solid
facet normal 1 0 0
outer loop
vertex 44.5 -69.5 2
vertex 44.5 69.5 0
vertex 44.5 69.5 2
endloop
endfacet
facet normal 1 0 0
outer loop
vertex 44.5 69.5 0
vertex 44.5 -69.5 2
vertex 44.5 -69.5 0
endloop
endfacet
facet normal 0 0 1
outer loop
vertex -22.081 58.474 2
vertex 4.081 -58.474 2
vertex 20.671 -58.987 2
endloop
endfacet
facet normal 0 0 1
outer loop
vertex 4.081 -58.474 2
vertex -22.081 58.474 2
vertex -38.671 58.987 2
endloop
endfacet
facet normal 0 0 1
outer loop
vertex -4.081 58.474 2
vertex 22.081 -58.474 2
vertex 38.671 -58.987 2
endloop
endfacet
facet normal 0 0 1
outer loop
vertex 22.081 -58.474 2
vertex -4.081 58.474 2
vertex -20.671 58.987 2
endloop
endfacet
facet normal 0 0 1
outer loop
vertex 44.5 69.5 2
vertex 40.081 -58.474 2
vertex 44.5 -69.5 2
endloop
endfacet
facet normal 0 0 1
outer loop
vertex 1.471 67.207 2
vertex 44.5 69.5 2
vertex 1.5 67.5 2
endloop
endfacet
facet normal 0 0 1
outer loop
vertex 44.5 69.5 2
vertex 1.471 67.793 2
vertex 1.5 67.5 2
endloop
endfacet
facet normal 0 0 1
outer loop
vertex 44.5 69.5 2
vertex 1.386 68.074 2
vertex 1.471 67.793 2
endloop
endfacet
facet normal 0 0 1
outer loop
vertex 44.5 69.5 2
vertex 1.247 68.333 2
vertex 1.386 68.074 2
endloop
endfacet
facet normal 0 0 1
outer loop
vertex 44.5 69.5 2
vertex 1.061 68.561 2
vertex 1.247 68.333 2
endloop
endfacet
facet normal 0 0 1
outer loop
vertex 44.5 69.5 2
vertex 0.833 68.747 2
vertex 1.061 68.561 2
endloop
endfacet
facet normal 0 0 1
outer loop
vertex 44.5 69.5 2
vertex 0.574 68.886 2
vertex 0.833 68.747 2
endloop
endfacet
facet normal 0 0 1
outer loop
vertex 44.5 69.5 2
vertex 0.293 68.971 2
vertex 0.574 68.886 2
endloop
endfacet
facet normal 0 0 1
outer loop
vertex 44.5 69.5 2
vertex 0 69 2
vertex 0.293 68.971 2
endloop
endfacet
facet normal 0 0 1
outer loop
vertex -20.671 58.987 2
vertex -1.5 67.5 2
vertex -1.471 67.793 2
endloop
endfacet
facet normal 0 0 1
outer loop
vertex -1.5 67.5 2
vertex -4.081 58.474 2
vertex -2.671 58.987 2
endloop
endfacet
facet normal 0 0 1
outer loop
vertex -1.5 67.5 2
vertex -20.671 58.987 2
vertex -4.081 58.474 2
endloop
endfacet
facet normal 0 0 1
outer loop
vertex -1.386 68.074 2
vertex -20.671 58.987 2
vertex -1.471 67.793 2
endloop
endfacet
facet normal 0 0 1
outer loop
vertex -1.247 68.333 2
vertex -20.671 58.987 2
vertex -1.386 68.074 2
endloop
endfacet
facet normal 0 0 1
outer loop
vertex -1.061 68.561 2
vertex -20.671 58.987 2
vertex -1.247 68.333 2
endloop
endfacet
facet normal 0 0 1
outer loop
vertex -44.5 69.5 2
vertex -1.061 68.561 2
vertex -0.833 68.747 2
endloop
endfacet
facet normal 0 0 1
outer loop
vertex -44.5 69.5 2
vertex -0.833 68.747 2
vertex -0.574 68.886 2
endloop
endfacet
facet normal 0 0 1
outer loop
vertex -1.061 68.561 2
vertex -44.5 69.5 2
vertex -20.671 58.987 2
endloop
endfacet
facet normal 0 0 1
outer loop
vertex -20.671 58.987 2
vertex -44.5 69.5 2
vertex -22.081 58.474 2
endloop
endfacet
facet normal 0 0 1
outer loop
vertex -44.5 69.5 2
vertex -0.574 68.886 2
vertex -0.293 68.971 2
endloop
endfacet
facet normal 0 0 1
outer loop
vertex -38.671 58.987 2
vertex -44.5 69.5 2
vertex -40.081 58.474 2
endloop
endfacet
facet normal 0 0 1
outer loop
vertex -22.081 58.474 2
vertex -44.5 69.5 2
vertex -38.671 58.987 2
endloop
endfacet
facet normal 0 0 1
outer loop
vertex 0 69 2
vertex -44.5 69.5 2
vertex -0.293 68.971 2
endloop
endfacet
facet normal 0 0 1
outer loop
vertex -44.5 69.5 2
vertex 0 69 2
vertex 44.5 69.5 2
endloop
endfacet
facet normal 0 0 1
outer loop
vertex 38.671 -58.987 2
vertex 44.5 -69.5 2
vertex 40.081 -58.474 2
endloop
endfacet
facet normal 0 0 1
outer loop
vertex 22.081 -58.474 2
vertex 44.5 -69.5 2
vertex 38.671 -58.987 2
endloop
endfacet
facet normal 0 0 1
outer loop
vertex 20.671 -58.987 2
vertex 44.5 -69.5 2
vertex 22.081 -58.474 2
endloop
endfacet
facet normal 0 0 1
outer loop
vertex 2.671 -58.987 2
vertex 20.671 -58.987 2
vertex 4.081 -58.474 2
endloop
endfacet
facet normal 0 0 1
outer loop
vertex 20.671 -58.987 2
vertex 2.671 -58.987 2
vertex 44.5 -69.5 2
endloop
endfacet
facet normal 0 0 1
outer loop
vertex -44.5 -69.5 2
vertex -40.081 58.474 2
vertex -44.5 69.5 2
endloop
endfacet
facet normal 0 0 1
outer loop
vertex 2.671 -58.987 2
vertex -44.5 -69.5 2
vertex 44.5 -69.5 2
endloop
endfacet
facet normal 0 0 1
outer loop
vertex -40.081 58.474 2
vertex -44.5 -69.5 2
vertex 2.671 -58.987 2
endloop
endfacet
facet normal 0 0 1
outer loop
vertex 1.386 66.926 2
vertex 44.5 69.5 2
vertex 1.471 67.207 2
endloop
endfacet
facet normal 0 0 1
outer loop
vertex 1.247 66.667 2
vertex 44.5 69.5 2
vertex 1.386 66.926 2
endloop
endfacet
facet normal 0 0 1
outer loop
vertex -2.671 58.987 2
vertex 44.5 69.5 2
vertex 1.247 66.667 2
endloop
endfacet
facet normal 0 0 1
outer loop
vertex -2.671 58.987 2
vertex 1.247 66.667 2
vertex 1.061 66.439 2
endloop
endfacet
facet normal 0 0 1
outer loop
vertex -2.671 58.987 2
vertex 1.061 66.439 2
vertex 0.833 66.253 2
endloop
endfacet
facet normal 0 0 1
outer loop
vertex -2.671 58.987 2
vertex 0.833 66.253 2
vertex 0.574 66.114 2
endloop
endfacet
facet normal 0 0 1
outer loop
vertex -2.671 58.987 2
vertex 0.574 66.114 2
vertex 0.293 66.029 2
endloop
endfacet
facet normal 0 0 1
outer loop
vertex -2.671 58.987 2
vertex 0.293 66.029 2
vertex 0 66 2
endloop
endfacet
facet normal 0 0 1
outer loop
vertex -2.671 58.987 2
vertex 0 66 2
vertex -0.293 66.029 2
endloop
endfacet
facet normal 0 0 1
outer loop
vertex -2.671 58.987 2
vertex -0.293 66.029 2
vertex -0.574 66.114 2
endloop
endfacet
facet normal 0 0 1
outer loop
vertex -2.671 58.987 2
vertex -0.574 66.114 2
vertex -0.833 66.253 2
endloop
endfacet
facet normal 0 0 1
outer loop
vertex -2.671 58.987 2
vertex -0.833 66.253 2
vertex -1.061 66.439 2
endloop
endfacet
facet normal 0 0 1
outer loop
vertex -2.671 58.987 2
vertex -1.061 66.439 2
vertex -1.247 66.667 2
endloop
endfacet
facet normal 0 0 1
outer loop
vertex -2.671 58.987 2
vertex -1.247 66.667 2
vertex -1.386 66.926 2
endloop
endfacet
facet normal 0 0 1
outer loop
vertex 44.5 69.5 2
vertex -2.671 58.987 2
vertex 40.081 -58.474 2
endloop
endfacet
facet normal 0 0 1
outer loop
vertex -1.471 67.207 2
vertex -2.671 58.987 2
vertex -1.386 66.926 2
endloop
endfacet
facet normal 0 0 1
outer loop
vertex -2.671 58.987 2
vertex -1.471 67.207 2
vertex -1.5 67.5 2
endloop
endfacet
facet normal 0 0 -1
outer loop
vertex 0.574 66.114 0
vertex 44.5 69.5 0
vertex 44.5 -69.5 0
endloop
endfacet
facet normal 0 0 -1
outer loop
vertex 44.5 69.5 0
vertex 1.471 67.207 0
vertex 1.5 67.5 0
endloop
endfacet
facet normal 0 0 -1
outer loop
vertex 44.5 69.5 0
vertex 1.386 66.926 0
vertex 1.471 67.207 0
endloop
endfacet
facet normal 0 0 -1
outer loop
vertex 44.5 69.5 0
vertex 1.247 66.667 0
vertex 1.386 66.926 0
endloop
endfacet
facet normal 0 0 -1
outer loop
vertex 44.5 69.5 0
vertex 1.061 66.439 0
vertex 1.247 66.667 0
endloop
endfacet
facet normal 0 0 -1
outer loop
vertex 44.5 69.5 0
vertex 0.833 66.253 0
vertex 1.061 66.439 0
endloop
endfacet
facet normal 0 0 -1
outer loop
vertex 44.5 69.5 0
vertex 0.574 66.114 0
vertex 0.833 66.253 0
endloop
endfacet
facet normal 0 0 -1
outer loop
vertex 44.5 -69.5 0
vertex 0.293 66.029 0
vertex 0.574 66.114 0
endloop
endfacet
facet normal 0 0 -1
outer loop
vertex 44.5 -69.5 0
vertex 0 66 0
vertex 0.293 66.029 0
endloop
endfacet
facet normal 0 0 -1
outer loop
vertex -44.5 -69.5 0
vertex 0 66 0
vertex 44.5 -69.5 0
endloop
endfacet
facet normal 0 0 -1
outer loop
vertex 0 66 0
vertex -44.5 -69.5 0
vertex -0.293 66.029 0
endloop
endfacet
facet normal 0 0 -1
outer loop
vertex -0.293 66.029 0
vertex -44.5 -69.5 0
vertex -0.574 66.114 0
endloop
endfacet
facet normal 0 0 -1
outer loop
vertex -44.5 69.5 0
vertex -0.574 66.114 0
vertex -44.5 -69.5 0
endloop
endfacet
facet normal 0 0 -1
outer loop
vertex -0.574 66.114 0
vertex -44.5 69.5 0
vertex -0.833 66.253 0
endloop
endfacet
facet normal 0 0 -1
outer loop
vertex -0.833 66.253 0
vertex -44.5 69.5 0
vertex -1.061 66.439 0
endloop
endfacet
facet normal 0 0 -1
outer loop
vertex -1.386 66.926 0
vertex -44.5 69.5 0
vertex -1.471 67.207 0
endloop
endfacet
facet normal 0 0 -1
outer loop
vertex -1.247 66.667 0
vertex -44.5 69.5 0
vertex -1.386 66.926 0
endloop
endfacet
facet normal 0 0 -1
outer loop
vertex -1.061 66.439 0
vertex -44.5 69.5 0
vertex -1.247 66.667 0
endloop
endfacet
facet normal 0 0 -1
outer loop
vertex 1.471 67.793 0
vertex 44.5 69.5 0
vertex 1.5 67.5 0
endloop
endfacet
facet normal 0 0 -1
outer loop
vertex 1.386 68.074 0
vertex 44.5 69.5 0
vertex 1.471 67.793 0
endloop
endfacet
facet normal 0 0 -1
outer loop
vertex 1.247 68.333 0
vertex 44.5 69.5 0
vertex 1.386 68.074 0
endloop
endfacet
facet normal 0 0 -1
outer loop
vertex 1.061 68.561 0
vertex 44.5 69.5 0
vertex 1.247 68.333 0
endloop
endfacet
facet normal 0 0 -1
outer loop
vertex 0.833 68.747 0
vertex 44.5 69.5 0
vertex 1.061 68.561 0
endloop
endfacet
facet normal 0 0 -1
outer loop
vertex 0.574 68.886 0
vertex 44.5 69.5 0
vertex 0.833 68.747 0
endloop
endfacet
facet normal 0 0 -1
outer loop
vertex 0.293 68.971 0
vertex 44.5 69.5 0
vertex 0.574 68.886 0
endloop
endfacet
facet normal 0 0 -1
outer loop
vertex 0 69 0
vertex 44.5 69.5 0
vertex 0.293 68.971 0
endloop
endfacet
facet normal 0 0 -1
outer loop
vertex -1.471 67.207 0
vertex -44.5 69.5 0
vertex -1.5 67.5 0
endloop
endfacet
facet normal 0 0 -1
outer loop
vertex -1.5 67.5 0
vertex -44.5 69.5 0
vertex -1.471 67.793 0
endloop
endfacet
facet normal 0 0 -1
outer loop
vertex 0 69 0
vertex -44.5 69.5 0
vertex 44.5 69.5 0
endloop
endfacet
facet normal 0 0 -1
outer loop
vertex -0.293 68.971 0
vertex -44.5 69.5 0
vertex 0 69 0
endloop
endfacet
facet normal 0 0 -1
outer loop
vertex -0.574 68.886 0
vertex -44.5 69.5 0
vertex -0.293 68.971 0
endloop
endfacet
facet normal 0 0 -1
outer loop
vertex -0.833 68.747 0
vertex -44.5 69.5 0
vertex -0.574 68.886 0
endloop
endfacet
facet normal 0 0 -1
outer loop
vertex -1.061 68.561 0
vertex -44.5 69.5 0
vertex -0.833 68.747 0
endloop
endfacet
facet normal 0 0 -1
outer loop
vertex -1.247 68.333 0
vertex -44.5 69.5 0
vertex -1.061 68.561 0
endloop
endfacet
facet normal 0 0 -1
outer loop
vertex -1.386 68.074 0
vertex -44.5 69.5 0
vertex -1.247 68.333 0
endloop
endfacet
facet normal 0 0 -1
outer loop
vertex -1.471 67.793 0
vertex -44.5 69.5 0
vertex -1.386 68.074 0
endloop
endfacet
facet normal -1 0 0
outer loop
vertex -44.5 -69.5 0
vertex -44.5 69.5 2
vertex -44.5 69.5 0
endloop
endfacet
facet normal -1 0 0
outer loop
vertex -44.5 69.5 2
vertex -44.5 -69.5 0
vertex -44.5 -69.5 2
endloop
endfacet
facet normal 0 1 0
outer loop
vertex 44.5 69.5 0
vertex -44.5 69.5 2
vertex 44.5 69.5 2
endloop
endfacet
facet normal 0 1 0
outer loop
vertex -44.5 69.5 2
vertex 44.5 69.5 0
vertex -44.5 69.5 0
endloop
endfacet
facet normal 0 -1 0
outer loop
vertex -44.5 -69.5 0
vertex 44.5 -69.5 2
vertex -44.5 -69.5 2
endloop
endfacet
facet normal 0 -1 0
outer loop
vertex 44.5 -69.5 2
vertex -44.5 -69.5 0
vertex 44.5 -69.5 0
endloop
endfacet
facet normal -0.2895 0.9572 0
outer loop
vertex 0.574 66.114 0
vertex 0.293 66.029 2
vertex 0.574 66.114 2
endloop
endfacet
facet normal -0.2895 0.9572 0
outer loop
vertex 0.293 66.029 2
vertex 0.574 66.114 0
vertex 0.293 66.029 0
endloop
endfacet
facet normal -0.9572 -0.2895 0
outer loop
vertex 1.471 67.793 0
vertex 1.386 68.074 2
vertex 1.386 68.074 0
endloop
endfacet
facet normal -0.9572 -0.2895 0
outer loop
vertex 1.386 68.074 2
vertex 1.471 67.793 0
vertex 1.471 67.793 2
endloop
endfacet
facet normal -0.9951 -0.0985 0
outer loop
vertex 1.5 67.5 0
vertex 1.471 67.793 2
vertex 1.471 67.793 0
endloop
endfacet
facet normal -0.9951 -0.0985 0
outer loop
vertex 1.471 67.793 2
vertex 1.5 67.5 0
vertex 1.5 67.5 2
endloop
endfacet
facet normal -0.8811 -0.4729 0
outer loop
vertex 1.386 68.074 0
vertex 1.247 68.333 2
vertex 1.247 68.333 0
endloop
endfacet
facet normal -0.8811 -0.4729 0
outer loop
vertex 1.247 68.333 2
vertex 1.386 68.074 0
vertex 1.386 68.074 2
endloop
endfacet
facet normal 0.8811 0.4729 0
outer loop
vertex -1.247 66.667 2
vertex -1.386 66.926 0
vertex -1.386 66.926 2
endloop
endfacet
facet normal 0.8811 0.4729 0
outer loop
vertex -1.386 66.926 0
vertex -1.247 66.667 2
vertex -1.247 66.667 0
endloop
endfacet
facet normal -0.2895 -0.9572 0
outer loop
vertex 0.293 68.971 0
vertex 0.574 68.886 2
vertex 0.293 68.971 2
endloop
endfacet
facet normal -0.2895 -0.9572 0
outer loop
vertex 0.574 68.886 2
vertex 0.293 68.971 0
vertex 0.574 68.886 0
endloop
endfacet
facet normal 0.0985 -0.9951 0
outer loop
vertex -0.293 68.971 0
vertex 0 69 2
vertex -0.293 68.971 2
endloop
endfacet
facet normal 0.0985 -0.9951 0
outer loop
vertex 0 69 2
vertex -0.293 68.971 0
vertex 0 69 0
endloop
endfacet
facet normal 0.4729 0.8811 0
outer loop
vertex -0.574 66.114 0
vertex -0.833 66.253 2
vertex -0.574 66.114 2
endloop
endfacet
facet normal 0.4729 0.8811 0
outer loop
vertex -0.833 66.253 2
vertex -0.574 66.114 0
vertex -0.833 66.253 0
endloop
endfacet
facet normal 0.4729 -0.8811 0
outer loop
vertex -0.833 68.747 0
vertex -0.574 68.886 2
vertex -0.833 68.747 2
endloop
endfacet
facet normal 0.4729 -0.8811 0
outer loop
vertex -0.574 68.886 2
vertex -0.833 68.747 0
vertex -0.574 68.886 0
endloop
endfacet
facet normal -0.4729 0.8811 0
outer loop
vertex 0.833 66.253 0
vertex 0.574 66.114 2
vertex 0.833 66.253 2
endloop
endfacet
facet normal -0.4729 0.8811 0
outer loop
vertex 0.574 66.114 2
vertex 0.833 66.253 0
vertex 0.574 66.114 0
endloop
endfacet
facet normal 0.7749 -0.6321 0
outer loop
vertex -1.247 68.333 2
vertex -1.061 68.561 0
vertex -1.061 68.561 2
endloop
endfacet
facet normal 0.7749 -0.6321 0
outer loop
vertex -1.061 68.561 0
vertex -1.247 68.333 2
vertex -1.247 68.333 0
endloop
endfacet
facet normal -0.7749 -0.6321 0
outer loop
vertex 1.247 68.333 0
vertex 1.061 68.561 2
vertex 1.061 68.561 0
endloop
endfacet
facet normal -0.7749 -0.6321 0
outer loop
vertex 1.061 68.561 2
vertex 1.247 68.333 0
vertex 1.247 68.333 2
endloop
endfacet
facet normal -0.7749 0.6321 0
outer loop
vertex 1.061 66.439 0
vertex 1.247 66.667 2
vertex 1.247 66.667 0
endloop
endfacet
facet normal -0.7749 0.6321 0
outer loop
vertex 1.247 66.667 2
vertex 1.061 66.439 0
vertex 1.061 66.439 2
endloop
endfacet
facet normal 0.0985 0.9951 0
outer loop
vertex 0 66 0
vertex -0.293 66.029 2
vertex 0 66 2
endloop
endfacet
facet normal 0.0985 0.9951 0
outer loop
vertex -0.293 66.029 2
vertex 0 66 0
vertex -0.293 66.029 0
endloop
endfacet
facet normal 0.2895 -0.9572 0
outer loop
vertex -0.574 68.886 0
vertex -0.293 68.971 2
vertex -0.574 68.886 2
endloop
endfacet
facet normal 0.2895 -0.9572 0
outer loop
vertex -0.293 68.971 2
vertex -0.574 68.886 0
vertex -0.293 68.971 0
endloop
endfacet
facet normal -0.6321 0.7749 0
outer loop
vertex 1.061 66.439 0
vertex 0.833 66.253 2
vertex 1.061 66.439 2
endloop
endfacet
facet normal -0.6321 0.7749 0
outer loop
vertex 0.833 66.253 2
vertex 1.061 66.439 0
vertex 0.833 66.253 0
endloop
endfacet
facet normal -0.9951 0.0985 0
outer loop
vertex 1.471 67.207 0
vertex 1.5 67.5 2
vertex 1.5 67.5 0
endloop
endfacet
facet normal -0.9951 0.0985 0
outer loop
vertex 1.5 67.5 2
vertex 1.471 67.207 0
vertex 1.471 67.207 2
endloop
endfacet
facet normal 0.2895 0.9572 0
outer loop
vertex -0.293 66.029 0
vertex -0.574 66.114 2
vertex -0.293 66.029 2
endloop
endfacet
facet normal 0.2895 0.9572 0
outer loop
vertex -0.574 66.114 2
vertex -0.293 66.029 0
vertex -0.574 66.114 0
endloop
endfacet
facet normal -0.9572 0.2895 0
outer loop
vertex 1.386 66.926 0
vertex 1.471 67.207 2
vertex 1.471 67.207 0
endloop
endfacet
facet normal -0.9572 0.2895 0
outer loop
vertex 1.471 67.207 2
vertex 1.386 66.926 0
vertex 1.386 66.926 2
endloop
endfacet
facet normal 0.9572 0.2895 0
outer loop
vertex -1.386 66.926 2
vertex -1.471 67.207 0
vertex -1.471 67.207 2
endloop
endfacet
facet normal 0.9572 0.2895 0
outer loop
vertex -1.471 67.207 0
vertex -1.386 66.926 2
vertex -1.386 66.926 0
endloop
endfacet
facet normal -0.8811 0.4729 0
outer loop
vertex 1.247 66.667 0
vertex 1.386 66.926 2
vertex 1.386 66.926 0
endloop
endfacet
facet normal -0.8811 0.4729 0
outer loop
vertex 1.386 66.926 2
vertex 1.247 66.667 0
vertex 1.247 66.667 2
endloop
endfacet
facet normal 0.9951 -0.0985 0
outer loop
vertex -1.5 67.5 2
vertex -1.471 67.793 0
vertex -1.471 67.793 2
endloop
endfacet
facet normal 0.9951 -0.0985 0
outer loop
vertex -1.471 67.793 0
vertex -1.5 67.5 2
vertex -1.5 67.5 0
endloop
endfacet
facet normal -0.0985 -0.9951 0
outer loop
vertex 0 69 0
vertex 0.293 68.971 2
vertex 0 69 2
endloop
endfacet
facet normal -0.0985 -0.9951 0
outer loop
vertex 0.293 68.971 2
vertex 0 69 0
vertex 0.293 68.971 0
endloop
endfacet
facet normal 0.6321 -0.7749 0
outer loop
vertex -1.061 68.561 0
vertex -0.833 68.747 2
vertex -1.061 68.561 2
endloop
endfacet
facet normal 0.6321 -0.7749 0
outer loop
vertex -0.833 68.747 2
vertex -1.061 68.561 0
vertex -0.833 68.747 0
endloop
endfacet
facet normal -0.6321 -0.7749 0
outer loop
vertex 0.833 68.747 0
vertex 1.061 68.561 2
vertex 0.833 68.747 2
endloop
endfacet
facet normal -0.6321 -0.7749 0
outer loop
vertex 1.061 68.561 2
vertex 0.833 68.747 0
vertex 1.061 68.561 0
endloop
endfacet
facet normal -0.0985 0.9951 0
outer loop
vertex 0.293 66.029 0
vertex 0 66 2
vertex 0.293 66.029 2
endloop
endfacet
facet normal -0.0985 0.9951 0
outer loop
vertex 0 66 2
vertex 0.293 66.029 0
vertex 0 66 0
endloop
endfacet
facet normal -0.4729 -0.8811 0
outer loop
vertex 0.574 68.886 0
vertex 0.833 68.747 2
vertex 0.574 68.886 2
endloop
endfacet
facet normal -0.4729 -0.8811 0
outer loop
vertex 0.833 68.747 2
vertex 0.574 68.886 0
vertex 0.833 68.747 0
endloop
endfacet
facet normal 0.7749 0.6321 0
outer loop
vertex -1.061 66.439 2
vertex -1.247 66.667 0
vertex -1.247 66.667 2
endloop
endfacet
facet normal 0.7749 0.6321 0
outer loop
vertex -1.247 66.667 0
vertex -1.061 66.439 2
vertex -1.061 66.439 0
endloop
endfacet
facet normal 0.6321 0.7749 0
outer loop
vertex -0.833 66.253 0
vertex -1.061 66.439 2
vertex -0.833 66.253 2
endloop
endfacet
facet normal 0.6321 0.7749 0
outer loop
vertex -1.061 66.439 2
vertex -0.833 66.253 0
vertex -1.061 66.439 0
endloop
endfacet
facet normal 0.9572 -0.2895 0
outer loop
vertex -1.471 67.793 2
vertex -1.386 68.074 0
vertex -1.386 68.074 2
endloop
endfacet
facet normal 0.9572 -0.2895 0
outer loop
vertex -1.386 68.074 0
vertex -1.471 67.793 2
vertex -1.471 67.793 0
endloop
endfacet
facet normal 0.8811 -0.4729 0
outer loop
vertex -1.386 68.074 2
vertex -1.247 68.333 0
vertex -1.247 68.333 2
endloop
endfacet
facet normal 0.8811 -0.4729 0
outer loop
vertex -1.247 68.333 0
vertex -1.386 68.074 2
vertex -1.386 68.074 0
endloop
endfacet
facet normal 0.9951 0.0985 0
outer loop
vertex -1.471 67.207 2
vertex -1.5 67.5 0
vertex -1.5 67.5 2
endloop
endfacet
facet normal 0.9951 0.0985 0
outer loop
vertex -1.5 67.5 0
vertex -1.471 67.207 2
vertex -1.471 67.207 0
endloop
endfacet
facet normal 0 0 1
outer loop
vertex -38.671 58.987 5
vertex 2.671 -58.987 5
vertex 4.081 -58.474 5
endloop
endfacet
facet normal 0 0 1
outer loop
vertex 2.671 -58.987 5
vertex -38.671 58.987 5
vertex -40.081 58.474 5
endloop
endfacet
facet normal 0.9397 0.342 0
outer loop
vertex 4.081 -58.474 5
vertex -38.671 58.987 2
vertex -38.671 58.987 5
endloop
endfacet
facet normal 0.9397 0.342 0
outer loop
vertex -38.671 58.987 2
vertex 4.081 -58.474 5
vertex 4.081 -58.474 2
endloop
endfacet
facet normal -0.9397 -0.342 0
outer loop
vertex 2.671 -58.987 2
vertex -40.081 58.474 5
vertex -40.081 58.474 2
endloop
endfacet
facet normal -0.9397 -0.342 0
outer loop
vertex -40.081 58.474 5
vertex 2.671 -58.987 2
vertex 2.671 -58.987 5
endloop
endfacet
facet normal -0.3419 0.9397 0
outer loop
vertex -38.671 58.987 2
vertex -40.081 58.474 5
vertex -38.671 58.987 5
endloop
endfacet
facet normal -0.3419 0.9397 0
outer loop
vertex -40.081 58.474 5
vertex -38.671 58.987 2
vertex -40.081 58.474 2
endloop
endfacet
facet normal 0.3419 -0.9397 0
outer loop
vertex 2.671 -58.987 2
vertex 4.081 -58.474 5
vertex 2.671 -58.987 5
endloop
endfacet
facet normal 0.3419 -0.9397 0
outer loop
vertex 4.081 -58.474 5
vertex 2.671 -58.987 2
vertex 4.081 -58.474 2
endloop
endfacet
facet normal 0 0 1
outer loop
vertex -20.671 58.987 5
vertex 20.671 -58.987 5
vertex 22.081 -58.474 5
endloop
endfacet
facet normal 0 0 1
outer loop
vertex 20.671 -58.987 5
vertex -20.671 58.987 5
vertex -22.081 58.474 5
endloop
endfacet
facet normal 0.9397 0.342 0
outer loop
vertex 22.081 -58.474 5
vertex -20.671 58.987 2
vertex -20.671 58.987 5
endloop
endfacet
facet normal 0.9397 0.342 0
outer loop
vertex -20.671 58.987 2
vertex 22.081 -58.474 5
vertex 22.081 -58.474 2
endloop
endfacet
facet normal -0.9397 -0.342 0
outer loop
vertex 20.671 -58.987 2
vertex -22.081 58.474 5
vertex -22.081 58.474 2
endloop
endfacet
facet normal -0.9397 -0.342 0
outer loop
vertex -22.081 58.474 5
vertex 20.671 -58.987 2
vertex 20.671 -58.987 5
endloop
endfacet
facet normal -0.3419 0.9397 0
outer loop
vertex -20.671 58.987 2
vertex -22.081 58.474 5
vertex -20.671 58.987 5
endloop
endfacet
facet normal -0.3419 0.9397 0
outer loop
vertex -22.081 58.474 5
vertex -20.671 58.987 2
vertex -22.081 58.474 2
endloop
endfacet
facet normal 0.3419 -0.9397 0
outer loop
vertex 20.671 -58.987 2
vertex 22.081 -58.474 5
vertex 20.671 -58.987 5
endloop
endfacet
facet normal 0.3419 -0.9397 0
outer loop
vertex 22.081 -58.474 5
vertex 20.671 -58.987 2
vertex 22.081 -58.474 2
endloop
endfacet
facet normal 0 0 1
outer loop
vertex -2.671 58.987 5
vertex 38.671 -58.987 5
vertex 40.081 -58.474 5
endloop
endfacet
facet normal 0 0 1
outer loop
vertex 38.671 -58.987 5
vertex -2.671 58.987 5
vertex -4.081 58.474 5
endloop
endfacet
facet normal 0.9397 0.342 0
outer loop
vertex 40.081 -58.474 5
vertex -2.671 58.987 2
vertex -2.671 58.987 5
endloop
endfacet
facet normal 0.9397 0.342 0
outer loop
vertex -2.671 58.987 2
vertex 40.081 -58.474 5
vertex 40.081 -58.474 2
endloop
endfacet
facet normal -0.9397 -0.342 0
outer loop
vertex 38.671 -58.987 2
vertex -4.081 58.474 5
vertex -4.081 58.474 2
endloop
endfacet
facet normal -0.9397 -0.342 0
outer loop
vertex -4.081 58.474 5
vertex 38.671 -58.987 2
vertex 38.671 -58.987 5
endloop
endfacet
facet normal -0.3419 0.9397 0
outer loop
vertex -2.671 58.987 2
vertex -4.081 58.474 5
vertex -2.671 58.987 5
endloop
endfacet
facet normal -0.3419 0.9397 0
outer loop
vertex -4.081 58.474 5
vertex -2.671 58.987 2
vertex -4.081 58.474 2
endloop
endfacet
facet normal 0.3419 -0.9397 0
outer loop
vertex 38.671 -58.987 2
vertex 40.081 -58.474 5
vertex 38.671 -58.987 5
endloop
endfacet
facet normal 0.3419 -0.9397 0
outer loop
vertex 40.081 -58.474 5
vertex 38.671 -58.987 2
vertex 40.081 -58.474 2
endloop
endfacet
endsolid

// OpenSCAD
// Baffle Insert V3.5 — Rectangular Testing Variant
// For AeroCool Flat Tile V3.5 (rectangular test build)
// Drops into the expansion chamber of the rectangular base tile V3.5
// Print: Flat on bed, with FUZZY SKIN enabled, PETG, 0.2mm layer, 15-20% infill
// Estimated print time: ~25-35 min, ~12g PETG
//
// IMPORTANT: Enable FUZZY SKIN in your slicer for water retention!
// Cura: Experimental > Fuzzy Skin (thickness 0.3-0.5mm, density 1.0-2.0)
// PrusaSlicer: Layers and perimeters > Fuzzy skin
// This creates microscopic pockets that trap water on hydrophobic PETG.

// ============================================================
// PARAMETERS (must match base tile V3.5)
// ============================================================

INSERT_WIDTH = 89;        // Chamber inner width - 1mm tolerance (100 - 10 - 1 = 89)
INSERT_LENGTH = 139;      // Chamber inner length - 1mm tolerance (150 - 10 - 1 = 139)
INSERT_THICKNESS = 2;     // Base plate thickness (mm)
FIN_HEIGHT = 3;           // Fin height above plate (mm)
FIN_LENGTH = 125;         // Fin length (mm) — spans most of the insert length
FIN_THICKNESS = 1.5;      // Fin thickness (mm)
FIN_ANGLE = 20;           // Angle to airflow (degrees)
FIN_OFFSETS = [-18, 0, 18]; // X offsets for each fin (mm, spaced across width)
FILL_PORT_D = 3;          // Fill port diameter (mm)

// ============================================================
// MODULES
// ============================================================

module rect_prism(width, length, height) {
    translate([-width/2, -length/2, 0])
        cube([width, length, height]);
}

// ============================================================
// MAIN
// ============================================================

difference() {
    // Base plate
    rect_prism(INSERT_WIDTH, INSERT_LENGTH, INSERT_THICKNESS);
    
    // Fill port hole — aligns with base tile fill port
    translate([0, INSERT_LENGTH/2 - 2, -0.01])
        cylinder(h = INSERT_THICKNESS + 0.02, d = FILL_PORT_D, $fn = 32);
}

// Fins on top of plate — angled to intercept water droplets in airflow
// Fins span the LENGTH direction (along the sliding door gap / window opening)
// Airflow is along the LENGTH direction (left to right or right to left)
// Fins are angled across the flow to catch droplets
for (offset = FIN_OFFSETS) {
    translate([offset, 0, INSERT_THICKNESS])
        rotate([0, 0, FIN_ANGLE])
            translate([-FIN_THICKNESS/2, -FIN_LENGTH/2, 0])
                cube([FIN_THICKNESS, FIN_LENGTH, FIN_HEIGHT]);
}

// ============================================================
// HOW IT WORKS
// ============================================================
// 1. Drop this insert into the chamber of the rectangular base tile V3.5
// 2. The 3 fins divide the chamber into airflow channels along the length
// 3. Wet the fins with water (spray or pour through fill port)
// 4. Air flows through the Venturi funnels and into the chamber
// 5. Water droplets on the fins evaporate, cooling the air
// 6. Fuzzy skin texture holds water on the hydrophobic PETG
// 7. Mineral deposits from tap water gradually improve wicking over time
// 8. After 6-12 months, replace the insert ($5-8 cost)
//
// LAYER LINE ORIENTATION:
// This insert is printed FLAT on the bed, so layer lines are horizontal.
// When installed, airflow is along the LENGTH (horizontal, perpendicular to layer lines).
// This creates cross-flow roughness that traps water effectively.
// ============================================================
//
// DESIGN NOTE: This is a rectangular testing variant only.
// The hexagonal V3 baffle insert remains the general design.
// This rectangle is for rapid testing in standard window frames
// and sliding door gaps.
// ============================================================

// ============================================================
// SLICER SETTINGS
// ============================================================
// Material: PETG
// Nozzle: 0.4mm standard
// Layer height: 0.2mm
// Infill: 15-20%
// Fuzzy skin: ENABLED (thickness 0.3-0.5mm, density 1.0-2.0)
// Print orientation: Flat on bed (layer lines horizontal = cross-flow)
// Supports: NONE
// Bed adhesion: Brim recommended
// ============================================================
